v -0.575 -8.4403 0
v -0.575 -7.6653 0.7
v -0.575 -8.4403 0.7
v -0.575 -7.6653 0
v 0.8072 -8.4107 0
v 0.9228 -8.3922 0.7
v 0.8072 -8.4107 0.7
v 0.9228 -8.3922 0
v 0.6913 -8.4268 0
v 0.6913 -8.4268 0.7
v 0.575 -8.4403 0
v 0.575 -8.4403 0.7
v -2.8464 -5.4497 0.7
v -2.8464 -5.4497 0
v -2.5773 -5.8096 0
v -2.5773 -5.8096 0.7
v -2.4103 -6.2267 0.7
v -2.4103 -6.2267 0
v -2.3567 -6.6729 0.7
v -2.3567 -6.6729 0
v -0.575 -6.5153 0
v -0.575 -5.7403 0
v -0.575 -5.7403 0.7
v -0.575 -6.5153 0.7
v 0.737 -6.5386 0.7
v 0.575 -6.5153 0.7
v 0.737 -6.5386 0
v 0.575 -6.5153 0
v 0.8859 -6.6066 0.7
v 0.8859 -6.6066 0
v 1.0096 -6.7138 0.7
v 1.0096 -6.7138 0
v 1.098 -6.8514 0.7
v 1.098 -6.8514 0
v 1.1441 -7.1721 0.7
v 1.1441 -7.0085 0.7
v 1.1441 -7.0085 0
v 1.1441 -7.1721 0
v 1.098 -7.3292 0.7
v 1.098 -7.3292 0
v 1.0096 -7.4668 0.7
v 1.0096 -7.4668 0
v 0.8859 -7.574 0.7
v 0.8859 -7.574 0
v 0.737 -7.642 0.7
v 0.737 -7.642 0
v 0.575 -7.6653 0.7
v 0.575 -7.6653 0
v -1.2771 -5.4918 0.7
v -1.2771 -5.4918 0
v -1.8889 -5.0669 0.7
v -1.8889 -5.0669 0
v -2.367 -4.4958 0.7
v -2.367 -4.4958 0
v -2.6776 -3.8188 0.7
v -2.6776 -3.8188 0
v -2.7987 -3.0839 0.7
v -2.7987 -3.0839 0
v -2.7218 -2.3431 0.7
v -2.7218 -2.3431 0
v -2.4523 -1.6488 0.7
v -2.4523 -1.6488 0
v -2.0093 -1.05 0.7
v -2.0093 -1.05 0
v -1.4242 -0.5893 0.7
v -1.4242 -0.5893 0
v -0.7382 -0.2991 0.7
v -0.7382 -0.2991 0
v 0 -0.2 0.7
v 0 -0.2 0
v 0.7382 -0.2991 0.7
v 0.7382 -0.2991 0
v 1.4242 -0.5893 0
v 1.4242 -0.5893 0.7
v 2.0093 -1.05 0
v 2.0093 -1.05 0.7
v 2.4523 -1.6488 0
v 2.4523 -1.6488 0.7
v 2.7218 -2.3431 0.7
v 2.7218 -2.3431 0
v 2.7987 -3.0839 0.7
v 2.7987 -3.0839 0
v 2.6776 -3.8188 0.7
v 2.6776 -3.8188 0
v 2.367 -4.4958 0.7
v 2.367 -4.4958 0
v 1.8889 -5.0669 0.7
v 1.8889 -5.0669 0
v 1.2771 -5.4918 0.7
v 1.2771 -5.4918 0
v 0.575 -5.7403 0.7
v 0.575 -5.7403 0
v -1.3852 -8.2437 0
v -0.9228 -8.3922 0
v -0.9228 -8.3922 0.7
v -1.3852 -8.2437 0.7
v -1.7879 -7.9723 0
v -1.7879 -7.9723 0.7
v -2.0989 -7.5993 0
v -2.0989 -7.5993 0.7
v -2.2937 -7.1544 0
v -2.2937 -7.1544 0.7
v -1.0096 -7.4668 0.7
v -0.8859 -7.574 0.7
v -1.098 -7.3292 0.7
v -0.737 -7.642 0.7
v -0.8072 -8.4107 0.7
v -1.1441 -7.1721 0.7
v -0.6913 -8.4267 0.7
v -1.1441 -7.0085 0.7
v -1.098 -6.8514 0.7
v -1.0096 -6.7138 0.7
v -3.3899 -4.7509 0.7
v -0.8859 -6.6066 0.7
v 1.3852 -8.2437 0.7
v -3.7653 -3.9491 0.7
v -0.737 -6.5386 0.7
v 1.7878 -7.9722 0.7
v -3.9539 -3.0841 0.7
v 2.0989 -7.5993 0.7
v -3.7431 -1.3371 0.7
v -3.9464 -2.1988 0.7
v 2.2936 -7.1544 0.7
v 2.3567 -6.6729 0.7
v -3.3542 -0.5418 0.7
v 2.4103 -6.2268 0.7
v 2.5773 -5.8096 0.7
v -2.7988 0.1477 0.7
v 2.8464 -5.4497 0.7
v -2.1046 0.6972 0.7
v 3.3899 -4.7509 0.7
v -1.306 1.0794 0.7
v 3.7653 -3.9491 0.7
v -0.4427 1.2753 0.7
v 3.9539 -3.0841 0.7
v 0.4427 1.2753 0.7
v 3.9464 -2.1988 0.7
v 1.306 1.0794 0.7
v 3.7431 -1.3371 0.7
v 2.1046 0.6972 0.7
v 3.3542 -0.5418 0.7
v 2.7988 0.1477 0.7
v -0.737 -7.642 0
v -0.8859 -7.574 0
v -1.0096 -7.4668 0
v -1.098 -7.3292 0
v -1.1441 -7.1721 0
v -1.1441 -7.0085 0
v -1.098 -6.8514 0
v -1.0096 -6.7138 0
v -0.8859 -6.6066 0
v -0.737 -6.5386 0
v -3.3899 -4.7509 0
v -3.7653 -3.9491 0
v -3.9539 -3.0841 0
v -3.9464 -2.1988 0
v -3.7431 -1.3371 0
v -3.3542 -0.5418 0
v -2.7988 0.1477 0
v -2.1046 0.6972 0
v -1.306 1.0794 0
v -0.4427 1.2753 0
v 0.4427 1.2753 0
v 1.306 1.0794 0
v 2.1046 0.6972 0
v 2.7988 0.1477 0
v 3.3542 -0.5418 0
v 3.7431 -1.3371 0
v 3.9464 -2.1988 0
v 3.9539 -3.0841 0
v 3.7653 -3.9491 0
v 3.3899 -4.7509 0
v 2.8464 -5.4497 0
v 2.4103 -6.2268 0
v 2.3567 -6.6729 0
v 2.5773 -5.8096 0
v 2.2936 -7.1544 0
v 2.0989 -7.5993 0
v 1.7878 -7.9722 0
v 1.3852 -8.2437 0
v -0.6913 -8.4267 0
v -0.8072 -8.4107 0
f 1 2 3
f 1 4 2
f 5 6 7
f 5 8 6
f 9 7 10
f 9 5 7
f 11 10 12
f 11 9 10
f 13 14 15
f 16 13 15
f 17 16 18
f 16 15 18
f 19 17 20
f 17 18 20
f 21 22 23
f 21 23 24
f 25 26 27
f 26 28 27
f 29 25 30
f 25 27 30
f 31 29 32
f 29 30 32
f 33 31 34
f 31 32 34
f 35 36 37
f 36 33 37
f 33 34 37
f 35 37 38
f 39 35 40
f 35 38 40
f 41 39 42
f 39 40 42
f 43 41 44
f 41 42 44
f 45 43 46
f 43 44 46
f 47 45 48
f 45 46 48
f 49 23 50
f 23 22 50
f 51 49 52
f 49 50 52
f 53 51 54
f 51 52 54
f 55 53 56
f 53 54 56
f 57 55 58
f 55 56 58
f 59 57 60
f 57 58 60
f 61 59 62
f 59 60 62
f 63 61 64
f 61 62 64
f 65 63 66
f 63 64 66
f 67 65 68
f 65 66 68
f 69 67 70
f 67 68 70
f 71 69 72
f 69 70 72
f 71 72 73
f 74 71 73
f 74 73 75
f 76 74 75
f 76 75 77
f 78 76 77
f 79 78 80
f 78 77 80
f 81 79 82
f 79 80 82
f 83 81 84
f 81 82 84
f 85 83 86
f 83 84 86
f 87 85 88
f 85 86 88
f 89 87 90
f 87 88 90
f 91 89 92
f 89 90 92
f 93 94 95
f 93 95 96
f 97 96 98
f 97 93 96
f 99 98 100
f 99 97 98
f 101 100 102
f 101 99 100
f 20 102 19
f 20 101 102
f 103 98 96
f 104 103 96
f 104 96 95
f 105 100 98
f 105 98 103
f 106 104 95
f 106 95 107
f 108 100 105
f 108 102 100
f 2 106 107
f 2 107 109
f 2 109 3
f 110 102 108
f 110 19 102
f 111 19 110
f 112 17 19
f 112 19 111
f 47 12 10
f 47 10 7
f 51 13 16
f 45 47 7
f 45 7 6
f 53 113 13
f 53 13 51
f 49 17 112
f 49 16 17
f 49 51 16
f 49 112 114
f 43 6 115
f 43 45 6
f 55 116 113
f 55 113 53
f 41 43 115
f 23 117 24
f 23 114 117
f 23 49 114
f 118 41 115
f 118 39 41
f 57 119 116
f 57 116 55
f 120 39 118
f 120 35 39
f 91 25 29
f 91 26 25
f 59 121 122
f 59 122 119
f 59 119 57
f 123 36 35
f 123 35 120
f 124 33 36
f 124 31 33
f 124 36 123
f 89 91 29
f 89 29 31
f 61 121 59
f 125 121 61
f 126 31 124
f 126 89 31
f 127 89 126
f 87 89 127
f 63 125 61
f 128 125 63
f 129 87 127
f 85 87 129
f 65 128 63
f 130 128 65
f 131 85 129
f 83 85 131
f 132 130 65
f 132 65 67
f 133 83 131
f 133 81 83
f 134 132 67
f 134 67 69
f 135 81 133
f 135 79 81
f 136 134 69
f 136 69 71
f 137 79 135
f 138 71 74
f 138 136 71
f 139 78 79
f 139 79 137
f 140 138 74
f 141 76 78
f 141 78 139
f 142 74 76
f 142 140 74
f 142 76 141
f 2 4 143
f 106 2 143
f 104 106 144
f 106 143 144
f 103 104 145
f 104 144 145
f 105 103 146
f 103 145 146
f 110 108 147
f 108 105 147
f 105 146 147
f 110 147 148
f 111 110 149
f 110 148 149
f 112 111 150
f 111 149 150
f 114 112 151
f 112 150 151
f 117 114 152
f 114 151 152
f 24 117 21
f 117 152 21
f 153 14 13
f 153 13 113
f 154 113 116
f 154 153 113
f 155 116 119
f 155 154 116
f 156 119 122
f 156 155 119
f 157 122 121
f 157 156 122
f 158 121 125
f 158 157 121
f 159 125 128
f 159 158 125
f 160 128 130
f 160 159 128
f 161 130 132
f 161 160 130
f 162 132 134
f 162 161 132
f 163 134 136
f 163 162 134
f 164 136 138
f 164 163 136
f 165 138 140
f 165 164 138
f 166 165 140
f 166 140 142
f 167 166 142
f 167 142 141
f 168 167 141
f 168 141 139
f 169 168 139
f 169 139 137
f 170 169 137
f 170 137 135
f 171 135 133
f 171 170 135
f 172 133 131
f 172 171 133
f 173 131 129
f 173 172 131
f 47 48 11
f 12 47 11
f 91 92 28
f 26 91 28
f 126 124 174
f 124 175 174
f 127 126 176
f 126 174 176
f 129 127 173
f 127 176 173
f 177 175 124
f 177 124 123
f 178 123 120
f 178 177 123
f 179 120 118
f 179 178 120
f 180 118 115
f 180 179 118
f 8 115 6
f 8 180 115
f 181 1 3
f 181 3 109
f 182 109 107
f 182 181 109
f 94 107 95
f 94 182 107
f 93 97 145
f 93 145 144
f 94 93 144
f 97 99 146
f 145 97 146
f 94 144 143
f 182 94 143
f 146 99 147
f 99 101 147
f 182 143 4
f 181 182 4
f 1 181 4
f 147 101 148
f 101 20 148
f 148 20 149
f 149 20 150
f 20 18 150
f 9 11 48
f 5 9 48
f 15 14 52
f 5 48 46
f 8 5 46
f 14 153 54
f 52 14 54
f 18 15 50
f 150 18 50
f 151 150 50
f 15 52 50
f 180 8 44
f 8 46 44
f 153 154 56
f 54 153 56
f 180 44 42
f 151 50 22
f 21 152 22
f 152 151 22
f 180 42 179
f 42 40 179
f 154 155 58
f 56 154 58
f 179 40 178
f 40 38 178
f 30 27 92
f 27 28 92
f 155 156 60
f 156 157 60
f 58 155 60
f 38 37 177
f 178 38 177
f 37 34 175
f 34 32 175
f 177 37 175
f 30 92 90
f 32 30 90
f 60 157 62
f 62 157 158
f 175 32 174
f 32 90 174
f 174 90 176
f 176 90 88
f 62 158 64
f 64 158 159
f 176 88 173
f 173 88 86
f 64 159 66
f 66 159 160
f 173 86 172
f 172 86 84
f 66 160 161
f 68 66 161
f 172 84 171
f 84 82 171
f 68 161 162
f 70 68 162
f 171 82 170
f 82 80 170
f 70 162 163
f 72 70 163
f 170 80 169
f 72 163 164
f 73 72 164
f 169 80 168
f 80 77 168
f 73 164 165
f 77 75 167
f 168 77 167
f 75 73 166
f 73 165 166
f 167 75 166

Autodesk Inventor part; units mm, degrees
ref_plane "YZ Plane" through (0, 0, 0) normal (1, 0, 0) x (0, 1, 0)
ref_plane "XZ Plane" through (0, 0, 0) normal (0, 1, 0) x (-1, 0, 0)
sketch "Эскиз1" plane through (0, 0, 0) normal (0, 0, 1) x (1, 0, 0)
  line L0 (-6, 0) -> (6, 0) construction
  arc A0 (0.575, -5.7403) -> (-0.575, -5.7403) centre (0, -3) ccw
  line L1 (0, 4.8751) -> (0, -17.3507) projected
  line L2 (-8.435, 0) -> (8.435, 0) projected
  arc A1 (-0.575, -6.5153) -> (-0.575, -7.6653) centre (-0.575, -7.0903) ccw
  line L3 (-0.575, -5.7403) -> (-0.575, -6.5153)
  line L4 (-0.575, -7.6653) -> (-0.575, -8.4403)
  line L5 (-0.575, -6.5402) -> (-0.575, -13.29) construction
  line L6 (-2.7947, 1.3) -> (3.6722, 1.3) construction
  circle A2 centre (-0.575, -7.0903) radius 1.725 construction
  line L7 (0, -3) -> (-6.3375, -12.8769) construction
  arc A3 (2.8464, -5.4497) -> (-2.8464, -5.4497) centre (0, -2.675) ccw
  arc A4 (-0.9228, -8.3922) -> (-0.575, -8.4403) centre (0, -3) ccw
  arc A5 (-2.3567, -6.6729) -> (-0.9228, -8.3922) centre (-0.6318, -6.692) ccw
  arc A6 (-2.3567, -6.6729) -> (-2.8464, -5.4497) centre (-4.0816, -6.6538) ccw
  arc A7 (0.575, -7.6653) -> (0.575, -6.5153) centre (0.575, -7.0903) ccw
  line L8 (0.575, -5.7403) -> (0.575, -6.5153)
  line L9 (0.575, -7.6653) -> (0.575, -8.4403)
  line L10 (0.575, -6.5402) -> (0.575, -13.29) construction
  arc A8 (0.575, -8.4403) -> (0.9228, -8.3922) centre (0, -3) ccw
  arc A9 (0.9228, -8.3922) -> (2.3567, -6.6729) centre (0.6318, -6.692) ccw
  arc A10 (2.8464, -5.4497) -> (2.3567, -6.6729) centre (4.0816, -6.6538) ccw
  dimension "d1" = 6
  dimension "d0" = 5.6
  dimension "d2" = 2.7
  dimension "d3" = 0.575
  dimension "d8" = 0.575
  dimension "d9" = 1.35
  dimension "d10" = 1.3
  dimension "d11" = 3.45
  dimension "d12" = 0.325
  dimension "d13" = 1.725
  dimension "d14" = 1.725
extrude "Базовый элемент" add sketch "Эскиз1" along normal blind 0.7
ref_plane "Work Plane1" through (0, -3, 0) normal (-1, 0, 0) x (0, 0, 1)
equation "\"d1\" = WD"
equation "\"d0\" = ND"
equation "\"d2\" = SRB2"
equation "\"d3\" = 0.5 * SD5"
equation "\"d8\" = 0.5 * SD5"
equation "\"d9\" = 0.5 * SRB2"
equation "\"d10\" = SRB1"
equation "\"d11\" = 3 * SD5"
equation "\"d12\" = 0.25 * SRB1"
equation "\"d13\" = 1.5 * SD5"
equation "\"d14\" = 1.5 * SD5"
equation "\"d4\" = SD"
equation "\"WD\" = WDMIN"
equation "\"SD\" = 0.7"
equation "\"SRB1\" = 1.3"
equation "\"ND\" = 5.6"
equation "\"SRB2\" = 2.7"
equation "\"SD5\" = 1.15"
equation "\"WDMIN\" = 6"
equation "\"SD3\" = 5.4"
equation "\"WDMAX\" = 7"
equation "\"SNB\" = 0.8"
equation "\"BUBRMI\" = 0.6"
properties part number "Кольцо C6 ГОСТ 13942-86" material "Сталь, мягкая"
